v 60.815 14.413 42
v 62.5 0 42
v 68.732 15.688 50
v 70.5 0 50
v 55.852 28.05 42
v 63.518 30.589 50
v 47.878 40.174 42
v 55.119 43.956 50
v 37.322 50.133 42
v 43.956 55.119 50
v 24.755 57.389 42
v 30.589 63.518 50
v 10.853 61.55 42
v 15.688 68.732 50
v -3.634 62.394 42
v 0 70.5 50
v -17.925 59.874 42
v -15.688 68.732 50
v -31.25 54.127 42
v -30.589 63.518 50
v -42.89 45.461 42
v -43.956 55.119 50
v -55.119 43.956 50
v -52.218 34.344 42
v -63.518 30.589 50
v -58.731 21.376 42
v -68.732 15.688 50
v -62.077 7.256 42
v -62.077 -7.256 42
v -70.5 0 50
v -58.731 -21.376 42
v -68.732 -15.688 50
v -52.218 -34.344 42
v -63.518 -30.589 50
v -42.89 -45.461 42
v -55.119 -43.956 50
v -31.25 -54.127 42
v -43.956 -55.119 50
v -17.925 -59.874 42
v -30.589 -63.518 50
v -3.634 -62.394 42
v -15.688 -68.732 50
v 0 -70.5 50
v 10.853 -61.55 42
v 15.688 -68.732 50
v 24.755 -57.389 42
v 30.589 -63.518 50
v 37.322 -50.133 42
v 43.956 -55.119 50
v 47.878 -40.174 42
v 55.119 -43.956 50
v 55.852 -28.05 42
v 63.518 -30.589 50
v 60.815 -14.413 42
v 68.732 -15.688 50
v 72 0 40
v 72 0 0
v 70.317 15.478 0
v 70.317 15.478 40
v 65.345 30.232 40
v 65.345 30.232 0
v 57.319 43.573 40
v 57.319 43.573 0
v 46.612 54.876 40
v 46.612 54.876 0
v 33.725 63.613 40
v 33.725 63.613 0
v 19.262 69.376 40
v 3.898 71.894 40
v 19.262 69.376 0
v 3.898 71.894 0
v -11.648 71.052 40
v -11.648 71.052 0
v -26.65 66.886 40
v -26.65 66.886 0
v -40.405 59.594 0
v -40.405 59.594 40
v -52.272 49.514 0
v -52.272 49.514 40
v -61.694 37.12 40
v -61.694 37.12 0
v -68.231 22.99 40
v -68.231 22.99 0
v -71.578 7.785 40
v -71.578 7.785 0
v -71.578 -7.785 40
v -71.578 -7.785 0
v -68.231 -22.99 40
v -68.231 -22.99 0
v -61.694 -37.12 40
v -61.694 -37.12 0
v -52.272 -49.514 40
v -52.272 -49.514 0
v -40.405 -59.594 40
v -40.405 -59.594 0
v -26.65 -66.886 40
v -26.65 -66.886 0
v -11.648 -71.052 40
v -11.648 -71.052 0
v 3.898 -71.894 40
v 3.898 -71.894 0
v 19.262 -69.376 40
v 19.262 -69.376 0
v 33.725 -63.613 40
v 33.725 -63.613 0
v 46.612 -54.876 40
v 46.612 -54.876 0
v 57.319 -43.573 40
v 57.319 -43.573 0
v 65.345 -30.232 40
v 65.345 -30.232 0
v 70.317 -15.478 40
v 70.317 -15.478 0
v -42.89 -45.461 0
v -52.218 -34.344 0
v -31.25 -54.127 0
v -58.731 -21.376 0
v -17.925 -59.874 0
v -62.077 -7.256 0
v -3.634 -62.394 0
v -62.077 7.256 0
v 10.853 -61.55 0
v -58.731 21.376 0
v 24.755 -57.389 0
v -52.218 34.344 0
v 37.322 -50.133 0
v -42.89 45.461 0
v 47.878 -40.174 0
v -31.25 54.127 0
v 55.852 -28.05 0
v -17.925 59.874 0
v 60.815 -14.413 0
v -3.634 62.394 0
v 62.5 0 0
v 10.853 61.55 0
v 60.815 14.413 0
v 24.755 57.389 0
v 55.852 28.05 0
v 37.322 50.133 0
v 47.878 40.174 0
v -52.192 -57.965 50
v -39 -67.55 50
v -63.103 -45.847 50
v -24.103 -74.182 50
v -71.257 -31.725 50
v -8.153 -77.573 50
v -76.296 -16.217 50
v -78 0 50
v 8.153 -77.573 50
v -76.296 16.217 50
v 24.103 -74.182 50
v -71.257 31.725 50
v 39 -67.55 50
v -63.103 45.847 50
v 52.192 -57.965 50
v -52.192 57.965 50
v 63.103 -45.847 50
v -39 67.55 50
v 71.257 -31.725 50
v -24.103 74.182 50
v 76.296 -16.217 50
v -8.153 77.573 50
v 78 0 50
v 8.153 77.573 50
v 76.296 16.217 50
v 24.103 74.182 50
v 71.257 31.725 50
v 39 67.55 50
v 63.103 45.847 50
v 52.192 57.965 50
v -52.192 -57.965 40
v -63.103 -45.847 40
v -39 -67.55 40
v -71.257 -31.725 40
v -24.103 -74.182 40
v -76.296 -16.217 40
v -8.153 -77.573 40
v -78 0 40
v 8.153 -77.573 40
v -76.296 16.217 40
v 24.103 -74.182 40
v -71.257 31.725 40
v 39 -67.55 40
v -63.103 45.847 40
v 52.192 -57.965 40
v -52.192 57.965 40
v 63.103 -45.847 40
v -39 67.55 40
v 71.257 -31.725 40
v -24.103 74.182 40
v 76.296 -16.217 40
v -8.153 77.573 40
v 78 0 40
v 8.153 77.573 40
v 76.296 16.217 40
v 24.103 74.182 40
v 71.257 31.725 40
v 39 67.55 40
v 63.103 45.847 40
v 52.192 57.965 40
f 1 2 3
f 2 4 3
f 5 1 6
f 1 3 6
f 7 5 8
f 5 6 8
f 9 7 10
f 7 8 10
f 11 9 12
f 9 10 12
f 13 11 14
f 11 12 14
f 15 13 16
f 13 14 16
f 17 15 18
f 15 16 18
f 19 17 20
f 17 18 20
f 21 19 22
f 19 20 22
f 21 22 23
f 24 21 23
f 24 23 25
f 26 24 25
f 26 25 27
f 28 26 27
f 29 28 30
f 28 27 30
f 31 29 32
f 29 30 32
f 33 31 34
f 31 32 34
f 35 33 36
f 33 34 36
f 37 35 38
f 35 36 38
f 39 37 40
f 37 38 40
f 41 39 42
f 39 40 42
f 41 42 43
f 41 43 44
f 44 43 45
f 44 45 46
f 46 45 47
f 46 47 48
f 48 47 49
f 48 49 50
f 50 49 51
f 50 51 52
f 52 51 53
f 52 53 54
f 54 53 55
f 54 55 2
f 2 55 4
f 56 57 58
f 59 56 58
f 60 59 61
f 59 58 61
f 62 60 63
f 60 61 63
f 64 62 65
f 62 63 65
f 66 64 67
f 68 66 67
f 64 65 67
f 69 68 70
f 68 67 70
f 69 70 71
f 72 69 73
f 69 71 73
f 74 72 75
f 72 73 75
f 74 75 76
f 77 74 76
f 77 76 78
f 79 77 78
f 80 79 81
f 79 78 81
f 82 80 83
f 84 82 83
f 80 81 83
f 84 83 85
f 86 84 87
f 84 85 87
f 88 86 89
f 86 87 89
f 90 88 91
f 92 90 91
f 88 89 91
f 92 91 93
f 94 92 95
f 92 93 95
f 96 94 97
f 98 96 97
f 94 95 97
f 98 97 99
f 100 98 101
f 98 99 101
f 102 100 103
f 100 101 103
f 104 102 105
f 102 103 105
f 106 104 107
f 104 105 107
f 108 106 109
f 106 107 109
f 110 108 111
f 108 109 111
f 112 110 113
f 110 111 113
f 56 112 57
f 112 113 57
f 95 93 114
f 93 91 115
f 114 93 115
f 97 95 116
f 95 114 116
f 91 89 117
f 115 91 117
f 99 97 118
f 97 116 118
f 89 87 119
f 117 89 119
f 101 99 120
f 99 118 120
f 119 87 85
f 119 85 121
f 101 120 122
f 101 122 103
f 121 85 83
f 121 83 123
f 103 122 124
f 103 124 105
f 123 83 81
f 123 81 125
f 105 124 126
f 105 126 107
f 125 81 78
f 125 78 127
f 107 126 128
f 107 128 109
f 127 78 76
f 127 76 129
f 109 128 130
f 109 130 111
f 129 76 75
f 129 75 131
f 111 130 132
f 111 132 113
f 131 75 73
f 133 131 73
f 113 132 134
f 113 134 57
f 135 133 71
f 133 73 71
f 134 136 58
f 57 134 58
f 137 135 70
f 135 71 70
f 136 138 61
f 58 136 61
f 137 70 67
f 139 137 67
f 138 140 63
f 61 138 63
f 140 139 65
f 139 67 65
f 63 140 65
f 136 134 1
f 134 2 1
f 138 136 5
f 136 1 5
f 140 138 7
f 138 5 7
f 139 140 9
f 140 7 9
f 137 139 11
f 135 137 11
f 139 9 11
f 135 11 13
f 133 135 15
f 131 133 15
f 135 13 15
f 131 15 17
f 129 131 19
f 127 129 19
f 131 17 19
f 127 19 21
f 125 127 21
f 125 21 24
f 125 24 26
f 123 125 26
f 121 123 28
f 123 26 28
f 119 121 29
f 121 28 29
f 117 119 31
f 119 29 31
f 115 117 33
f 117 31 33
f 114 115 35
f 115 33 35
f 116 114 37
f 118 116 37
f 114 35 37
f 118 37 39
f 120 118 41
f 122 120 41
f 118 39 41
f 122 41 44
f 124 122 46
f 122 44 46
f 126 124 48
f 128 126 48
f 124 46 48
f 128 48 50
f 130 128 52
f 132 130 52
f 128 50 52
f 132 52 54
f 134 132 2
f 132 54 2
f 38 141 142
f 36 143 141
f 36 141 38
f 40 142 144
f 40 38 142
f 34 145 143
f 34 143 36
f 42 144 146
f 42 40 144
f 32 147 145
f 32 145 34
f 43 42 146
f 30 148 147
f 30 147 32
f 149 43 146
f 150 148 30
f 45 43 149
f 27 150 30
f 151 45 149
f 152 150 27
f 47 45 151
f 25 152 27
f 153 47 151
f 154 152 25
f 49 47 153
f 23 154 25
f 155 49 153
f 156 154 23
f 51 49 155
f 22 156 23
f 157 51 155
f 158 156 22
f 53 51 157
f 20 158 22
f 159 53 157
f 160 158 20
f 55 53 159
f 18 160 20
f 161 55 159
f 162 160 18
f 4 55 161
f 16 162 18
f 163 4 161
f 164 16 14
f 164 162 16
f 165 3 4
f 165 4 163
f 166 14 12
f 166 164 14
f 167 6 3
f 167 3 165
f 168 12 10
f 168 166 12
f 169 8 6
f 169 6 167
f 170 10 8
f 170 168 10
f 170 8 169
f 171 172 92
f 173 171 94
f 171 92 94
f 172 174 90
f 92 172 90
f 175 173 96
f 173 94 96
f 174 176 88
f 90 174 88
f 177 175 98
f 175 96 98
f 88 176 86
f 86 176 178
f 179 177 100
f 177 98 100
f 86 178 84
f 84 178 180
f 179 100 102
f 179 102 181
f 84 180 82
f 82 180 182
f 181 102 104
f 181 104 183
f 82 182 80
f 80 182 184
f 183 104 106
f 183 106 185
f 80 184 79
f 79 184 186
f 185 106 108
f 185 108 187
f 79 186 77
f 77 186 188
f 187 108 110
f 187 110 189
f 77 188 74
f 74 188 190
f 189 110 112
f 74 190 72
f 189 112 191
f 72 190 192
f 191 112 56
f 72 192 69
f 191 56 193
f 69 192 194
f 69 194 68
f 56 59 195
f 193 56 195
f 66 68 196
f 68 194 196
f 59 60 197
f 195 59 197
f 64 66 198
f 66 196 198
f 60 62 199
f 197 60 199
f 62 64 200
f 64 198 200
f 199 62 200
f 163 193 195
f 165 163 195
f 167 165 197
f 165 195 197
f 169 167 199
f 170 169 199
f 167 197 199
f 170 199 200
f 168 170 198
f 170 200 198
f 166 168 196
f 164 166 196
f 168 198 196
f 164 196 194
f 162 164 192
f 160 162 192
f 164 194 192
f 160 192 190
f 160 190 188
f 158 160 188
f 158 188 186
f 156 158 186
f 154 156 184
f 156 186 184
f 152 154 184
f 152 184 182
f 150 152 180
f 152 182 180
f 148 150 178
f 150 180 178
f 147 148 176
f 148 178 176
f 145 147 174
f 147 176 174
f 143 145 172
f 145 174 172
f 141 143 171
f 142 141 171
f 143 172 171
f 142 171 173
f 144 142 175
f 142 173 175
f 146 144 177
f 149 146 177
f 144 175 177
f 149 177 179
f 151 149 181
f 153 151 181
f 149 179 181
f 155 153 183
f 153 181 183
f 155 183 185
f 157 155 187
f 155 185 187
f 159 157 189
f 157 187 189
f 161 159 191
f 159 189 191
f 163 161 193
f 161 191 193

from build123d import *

# Parameters (mm, degrees)
F0_R     = 72
F1_DEPTH = 40
F2_R     = 78
F3_DEPTH = 10


with BuildPart() as f1:
    # F0 (on Top) → F1 (new body)
    with BuildSketch(Plane.XY):
        Circle(F0_R)
    extrude(amount=F1_DEPTH)

    # F2 (on face) → F3 (join)
    with BuildSketch(Plane.XY.offset(40)):
        Circle(F2_R)
    extrude(amount=F3_DEPTH)

    # F4 (on Front) → F5 (revolve, cut)
    with BuildSketch(Plane.XZ):
        Polygon((70.5, 50), (0, 50), (0, 0), (62.5, 0), (62.5, 42), align=None)
    revolve(axis=Axis((0, 0, 50), (0, 0, 1)), mode=Mode.SUBTRACT)


solid = f1.part
